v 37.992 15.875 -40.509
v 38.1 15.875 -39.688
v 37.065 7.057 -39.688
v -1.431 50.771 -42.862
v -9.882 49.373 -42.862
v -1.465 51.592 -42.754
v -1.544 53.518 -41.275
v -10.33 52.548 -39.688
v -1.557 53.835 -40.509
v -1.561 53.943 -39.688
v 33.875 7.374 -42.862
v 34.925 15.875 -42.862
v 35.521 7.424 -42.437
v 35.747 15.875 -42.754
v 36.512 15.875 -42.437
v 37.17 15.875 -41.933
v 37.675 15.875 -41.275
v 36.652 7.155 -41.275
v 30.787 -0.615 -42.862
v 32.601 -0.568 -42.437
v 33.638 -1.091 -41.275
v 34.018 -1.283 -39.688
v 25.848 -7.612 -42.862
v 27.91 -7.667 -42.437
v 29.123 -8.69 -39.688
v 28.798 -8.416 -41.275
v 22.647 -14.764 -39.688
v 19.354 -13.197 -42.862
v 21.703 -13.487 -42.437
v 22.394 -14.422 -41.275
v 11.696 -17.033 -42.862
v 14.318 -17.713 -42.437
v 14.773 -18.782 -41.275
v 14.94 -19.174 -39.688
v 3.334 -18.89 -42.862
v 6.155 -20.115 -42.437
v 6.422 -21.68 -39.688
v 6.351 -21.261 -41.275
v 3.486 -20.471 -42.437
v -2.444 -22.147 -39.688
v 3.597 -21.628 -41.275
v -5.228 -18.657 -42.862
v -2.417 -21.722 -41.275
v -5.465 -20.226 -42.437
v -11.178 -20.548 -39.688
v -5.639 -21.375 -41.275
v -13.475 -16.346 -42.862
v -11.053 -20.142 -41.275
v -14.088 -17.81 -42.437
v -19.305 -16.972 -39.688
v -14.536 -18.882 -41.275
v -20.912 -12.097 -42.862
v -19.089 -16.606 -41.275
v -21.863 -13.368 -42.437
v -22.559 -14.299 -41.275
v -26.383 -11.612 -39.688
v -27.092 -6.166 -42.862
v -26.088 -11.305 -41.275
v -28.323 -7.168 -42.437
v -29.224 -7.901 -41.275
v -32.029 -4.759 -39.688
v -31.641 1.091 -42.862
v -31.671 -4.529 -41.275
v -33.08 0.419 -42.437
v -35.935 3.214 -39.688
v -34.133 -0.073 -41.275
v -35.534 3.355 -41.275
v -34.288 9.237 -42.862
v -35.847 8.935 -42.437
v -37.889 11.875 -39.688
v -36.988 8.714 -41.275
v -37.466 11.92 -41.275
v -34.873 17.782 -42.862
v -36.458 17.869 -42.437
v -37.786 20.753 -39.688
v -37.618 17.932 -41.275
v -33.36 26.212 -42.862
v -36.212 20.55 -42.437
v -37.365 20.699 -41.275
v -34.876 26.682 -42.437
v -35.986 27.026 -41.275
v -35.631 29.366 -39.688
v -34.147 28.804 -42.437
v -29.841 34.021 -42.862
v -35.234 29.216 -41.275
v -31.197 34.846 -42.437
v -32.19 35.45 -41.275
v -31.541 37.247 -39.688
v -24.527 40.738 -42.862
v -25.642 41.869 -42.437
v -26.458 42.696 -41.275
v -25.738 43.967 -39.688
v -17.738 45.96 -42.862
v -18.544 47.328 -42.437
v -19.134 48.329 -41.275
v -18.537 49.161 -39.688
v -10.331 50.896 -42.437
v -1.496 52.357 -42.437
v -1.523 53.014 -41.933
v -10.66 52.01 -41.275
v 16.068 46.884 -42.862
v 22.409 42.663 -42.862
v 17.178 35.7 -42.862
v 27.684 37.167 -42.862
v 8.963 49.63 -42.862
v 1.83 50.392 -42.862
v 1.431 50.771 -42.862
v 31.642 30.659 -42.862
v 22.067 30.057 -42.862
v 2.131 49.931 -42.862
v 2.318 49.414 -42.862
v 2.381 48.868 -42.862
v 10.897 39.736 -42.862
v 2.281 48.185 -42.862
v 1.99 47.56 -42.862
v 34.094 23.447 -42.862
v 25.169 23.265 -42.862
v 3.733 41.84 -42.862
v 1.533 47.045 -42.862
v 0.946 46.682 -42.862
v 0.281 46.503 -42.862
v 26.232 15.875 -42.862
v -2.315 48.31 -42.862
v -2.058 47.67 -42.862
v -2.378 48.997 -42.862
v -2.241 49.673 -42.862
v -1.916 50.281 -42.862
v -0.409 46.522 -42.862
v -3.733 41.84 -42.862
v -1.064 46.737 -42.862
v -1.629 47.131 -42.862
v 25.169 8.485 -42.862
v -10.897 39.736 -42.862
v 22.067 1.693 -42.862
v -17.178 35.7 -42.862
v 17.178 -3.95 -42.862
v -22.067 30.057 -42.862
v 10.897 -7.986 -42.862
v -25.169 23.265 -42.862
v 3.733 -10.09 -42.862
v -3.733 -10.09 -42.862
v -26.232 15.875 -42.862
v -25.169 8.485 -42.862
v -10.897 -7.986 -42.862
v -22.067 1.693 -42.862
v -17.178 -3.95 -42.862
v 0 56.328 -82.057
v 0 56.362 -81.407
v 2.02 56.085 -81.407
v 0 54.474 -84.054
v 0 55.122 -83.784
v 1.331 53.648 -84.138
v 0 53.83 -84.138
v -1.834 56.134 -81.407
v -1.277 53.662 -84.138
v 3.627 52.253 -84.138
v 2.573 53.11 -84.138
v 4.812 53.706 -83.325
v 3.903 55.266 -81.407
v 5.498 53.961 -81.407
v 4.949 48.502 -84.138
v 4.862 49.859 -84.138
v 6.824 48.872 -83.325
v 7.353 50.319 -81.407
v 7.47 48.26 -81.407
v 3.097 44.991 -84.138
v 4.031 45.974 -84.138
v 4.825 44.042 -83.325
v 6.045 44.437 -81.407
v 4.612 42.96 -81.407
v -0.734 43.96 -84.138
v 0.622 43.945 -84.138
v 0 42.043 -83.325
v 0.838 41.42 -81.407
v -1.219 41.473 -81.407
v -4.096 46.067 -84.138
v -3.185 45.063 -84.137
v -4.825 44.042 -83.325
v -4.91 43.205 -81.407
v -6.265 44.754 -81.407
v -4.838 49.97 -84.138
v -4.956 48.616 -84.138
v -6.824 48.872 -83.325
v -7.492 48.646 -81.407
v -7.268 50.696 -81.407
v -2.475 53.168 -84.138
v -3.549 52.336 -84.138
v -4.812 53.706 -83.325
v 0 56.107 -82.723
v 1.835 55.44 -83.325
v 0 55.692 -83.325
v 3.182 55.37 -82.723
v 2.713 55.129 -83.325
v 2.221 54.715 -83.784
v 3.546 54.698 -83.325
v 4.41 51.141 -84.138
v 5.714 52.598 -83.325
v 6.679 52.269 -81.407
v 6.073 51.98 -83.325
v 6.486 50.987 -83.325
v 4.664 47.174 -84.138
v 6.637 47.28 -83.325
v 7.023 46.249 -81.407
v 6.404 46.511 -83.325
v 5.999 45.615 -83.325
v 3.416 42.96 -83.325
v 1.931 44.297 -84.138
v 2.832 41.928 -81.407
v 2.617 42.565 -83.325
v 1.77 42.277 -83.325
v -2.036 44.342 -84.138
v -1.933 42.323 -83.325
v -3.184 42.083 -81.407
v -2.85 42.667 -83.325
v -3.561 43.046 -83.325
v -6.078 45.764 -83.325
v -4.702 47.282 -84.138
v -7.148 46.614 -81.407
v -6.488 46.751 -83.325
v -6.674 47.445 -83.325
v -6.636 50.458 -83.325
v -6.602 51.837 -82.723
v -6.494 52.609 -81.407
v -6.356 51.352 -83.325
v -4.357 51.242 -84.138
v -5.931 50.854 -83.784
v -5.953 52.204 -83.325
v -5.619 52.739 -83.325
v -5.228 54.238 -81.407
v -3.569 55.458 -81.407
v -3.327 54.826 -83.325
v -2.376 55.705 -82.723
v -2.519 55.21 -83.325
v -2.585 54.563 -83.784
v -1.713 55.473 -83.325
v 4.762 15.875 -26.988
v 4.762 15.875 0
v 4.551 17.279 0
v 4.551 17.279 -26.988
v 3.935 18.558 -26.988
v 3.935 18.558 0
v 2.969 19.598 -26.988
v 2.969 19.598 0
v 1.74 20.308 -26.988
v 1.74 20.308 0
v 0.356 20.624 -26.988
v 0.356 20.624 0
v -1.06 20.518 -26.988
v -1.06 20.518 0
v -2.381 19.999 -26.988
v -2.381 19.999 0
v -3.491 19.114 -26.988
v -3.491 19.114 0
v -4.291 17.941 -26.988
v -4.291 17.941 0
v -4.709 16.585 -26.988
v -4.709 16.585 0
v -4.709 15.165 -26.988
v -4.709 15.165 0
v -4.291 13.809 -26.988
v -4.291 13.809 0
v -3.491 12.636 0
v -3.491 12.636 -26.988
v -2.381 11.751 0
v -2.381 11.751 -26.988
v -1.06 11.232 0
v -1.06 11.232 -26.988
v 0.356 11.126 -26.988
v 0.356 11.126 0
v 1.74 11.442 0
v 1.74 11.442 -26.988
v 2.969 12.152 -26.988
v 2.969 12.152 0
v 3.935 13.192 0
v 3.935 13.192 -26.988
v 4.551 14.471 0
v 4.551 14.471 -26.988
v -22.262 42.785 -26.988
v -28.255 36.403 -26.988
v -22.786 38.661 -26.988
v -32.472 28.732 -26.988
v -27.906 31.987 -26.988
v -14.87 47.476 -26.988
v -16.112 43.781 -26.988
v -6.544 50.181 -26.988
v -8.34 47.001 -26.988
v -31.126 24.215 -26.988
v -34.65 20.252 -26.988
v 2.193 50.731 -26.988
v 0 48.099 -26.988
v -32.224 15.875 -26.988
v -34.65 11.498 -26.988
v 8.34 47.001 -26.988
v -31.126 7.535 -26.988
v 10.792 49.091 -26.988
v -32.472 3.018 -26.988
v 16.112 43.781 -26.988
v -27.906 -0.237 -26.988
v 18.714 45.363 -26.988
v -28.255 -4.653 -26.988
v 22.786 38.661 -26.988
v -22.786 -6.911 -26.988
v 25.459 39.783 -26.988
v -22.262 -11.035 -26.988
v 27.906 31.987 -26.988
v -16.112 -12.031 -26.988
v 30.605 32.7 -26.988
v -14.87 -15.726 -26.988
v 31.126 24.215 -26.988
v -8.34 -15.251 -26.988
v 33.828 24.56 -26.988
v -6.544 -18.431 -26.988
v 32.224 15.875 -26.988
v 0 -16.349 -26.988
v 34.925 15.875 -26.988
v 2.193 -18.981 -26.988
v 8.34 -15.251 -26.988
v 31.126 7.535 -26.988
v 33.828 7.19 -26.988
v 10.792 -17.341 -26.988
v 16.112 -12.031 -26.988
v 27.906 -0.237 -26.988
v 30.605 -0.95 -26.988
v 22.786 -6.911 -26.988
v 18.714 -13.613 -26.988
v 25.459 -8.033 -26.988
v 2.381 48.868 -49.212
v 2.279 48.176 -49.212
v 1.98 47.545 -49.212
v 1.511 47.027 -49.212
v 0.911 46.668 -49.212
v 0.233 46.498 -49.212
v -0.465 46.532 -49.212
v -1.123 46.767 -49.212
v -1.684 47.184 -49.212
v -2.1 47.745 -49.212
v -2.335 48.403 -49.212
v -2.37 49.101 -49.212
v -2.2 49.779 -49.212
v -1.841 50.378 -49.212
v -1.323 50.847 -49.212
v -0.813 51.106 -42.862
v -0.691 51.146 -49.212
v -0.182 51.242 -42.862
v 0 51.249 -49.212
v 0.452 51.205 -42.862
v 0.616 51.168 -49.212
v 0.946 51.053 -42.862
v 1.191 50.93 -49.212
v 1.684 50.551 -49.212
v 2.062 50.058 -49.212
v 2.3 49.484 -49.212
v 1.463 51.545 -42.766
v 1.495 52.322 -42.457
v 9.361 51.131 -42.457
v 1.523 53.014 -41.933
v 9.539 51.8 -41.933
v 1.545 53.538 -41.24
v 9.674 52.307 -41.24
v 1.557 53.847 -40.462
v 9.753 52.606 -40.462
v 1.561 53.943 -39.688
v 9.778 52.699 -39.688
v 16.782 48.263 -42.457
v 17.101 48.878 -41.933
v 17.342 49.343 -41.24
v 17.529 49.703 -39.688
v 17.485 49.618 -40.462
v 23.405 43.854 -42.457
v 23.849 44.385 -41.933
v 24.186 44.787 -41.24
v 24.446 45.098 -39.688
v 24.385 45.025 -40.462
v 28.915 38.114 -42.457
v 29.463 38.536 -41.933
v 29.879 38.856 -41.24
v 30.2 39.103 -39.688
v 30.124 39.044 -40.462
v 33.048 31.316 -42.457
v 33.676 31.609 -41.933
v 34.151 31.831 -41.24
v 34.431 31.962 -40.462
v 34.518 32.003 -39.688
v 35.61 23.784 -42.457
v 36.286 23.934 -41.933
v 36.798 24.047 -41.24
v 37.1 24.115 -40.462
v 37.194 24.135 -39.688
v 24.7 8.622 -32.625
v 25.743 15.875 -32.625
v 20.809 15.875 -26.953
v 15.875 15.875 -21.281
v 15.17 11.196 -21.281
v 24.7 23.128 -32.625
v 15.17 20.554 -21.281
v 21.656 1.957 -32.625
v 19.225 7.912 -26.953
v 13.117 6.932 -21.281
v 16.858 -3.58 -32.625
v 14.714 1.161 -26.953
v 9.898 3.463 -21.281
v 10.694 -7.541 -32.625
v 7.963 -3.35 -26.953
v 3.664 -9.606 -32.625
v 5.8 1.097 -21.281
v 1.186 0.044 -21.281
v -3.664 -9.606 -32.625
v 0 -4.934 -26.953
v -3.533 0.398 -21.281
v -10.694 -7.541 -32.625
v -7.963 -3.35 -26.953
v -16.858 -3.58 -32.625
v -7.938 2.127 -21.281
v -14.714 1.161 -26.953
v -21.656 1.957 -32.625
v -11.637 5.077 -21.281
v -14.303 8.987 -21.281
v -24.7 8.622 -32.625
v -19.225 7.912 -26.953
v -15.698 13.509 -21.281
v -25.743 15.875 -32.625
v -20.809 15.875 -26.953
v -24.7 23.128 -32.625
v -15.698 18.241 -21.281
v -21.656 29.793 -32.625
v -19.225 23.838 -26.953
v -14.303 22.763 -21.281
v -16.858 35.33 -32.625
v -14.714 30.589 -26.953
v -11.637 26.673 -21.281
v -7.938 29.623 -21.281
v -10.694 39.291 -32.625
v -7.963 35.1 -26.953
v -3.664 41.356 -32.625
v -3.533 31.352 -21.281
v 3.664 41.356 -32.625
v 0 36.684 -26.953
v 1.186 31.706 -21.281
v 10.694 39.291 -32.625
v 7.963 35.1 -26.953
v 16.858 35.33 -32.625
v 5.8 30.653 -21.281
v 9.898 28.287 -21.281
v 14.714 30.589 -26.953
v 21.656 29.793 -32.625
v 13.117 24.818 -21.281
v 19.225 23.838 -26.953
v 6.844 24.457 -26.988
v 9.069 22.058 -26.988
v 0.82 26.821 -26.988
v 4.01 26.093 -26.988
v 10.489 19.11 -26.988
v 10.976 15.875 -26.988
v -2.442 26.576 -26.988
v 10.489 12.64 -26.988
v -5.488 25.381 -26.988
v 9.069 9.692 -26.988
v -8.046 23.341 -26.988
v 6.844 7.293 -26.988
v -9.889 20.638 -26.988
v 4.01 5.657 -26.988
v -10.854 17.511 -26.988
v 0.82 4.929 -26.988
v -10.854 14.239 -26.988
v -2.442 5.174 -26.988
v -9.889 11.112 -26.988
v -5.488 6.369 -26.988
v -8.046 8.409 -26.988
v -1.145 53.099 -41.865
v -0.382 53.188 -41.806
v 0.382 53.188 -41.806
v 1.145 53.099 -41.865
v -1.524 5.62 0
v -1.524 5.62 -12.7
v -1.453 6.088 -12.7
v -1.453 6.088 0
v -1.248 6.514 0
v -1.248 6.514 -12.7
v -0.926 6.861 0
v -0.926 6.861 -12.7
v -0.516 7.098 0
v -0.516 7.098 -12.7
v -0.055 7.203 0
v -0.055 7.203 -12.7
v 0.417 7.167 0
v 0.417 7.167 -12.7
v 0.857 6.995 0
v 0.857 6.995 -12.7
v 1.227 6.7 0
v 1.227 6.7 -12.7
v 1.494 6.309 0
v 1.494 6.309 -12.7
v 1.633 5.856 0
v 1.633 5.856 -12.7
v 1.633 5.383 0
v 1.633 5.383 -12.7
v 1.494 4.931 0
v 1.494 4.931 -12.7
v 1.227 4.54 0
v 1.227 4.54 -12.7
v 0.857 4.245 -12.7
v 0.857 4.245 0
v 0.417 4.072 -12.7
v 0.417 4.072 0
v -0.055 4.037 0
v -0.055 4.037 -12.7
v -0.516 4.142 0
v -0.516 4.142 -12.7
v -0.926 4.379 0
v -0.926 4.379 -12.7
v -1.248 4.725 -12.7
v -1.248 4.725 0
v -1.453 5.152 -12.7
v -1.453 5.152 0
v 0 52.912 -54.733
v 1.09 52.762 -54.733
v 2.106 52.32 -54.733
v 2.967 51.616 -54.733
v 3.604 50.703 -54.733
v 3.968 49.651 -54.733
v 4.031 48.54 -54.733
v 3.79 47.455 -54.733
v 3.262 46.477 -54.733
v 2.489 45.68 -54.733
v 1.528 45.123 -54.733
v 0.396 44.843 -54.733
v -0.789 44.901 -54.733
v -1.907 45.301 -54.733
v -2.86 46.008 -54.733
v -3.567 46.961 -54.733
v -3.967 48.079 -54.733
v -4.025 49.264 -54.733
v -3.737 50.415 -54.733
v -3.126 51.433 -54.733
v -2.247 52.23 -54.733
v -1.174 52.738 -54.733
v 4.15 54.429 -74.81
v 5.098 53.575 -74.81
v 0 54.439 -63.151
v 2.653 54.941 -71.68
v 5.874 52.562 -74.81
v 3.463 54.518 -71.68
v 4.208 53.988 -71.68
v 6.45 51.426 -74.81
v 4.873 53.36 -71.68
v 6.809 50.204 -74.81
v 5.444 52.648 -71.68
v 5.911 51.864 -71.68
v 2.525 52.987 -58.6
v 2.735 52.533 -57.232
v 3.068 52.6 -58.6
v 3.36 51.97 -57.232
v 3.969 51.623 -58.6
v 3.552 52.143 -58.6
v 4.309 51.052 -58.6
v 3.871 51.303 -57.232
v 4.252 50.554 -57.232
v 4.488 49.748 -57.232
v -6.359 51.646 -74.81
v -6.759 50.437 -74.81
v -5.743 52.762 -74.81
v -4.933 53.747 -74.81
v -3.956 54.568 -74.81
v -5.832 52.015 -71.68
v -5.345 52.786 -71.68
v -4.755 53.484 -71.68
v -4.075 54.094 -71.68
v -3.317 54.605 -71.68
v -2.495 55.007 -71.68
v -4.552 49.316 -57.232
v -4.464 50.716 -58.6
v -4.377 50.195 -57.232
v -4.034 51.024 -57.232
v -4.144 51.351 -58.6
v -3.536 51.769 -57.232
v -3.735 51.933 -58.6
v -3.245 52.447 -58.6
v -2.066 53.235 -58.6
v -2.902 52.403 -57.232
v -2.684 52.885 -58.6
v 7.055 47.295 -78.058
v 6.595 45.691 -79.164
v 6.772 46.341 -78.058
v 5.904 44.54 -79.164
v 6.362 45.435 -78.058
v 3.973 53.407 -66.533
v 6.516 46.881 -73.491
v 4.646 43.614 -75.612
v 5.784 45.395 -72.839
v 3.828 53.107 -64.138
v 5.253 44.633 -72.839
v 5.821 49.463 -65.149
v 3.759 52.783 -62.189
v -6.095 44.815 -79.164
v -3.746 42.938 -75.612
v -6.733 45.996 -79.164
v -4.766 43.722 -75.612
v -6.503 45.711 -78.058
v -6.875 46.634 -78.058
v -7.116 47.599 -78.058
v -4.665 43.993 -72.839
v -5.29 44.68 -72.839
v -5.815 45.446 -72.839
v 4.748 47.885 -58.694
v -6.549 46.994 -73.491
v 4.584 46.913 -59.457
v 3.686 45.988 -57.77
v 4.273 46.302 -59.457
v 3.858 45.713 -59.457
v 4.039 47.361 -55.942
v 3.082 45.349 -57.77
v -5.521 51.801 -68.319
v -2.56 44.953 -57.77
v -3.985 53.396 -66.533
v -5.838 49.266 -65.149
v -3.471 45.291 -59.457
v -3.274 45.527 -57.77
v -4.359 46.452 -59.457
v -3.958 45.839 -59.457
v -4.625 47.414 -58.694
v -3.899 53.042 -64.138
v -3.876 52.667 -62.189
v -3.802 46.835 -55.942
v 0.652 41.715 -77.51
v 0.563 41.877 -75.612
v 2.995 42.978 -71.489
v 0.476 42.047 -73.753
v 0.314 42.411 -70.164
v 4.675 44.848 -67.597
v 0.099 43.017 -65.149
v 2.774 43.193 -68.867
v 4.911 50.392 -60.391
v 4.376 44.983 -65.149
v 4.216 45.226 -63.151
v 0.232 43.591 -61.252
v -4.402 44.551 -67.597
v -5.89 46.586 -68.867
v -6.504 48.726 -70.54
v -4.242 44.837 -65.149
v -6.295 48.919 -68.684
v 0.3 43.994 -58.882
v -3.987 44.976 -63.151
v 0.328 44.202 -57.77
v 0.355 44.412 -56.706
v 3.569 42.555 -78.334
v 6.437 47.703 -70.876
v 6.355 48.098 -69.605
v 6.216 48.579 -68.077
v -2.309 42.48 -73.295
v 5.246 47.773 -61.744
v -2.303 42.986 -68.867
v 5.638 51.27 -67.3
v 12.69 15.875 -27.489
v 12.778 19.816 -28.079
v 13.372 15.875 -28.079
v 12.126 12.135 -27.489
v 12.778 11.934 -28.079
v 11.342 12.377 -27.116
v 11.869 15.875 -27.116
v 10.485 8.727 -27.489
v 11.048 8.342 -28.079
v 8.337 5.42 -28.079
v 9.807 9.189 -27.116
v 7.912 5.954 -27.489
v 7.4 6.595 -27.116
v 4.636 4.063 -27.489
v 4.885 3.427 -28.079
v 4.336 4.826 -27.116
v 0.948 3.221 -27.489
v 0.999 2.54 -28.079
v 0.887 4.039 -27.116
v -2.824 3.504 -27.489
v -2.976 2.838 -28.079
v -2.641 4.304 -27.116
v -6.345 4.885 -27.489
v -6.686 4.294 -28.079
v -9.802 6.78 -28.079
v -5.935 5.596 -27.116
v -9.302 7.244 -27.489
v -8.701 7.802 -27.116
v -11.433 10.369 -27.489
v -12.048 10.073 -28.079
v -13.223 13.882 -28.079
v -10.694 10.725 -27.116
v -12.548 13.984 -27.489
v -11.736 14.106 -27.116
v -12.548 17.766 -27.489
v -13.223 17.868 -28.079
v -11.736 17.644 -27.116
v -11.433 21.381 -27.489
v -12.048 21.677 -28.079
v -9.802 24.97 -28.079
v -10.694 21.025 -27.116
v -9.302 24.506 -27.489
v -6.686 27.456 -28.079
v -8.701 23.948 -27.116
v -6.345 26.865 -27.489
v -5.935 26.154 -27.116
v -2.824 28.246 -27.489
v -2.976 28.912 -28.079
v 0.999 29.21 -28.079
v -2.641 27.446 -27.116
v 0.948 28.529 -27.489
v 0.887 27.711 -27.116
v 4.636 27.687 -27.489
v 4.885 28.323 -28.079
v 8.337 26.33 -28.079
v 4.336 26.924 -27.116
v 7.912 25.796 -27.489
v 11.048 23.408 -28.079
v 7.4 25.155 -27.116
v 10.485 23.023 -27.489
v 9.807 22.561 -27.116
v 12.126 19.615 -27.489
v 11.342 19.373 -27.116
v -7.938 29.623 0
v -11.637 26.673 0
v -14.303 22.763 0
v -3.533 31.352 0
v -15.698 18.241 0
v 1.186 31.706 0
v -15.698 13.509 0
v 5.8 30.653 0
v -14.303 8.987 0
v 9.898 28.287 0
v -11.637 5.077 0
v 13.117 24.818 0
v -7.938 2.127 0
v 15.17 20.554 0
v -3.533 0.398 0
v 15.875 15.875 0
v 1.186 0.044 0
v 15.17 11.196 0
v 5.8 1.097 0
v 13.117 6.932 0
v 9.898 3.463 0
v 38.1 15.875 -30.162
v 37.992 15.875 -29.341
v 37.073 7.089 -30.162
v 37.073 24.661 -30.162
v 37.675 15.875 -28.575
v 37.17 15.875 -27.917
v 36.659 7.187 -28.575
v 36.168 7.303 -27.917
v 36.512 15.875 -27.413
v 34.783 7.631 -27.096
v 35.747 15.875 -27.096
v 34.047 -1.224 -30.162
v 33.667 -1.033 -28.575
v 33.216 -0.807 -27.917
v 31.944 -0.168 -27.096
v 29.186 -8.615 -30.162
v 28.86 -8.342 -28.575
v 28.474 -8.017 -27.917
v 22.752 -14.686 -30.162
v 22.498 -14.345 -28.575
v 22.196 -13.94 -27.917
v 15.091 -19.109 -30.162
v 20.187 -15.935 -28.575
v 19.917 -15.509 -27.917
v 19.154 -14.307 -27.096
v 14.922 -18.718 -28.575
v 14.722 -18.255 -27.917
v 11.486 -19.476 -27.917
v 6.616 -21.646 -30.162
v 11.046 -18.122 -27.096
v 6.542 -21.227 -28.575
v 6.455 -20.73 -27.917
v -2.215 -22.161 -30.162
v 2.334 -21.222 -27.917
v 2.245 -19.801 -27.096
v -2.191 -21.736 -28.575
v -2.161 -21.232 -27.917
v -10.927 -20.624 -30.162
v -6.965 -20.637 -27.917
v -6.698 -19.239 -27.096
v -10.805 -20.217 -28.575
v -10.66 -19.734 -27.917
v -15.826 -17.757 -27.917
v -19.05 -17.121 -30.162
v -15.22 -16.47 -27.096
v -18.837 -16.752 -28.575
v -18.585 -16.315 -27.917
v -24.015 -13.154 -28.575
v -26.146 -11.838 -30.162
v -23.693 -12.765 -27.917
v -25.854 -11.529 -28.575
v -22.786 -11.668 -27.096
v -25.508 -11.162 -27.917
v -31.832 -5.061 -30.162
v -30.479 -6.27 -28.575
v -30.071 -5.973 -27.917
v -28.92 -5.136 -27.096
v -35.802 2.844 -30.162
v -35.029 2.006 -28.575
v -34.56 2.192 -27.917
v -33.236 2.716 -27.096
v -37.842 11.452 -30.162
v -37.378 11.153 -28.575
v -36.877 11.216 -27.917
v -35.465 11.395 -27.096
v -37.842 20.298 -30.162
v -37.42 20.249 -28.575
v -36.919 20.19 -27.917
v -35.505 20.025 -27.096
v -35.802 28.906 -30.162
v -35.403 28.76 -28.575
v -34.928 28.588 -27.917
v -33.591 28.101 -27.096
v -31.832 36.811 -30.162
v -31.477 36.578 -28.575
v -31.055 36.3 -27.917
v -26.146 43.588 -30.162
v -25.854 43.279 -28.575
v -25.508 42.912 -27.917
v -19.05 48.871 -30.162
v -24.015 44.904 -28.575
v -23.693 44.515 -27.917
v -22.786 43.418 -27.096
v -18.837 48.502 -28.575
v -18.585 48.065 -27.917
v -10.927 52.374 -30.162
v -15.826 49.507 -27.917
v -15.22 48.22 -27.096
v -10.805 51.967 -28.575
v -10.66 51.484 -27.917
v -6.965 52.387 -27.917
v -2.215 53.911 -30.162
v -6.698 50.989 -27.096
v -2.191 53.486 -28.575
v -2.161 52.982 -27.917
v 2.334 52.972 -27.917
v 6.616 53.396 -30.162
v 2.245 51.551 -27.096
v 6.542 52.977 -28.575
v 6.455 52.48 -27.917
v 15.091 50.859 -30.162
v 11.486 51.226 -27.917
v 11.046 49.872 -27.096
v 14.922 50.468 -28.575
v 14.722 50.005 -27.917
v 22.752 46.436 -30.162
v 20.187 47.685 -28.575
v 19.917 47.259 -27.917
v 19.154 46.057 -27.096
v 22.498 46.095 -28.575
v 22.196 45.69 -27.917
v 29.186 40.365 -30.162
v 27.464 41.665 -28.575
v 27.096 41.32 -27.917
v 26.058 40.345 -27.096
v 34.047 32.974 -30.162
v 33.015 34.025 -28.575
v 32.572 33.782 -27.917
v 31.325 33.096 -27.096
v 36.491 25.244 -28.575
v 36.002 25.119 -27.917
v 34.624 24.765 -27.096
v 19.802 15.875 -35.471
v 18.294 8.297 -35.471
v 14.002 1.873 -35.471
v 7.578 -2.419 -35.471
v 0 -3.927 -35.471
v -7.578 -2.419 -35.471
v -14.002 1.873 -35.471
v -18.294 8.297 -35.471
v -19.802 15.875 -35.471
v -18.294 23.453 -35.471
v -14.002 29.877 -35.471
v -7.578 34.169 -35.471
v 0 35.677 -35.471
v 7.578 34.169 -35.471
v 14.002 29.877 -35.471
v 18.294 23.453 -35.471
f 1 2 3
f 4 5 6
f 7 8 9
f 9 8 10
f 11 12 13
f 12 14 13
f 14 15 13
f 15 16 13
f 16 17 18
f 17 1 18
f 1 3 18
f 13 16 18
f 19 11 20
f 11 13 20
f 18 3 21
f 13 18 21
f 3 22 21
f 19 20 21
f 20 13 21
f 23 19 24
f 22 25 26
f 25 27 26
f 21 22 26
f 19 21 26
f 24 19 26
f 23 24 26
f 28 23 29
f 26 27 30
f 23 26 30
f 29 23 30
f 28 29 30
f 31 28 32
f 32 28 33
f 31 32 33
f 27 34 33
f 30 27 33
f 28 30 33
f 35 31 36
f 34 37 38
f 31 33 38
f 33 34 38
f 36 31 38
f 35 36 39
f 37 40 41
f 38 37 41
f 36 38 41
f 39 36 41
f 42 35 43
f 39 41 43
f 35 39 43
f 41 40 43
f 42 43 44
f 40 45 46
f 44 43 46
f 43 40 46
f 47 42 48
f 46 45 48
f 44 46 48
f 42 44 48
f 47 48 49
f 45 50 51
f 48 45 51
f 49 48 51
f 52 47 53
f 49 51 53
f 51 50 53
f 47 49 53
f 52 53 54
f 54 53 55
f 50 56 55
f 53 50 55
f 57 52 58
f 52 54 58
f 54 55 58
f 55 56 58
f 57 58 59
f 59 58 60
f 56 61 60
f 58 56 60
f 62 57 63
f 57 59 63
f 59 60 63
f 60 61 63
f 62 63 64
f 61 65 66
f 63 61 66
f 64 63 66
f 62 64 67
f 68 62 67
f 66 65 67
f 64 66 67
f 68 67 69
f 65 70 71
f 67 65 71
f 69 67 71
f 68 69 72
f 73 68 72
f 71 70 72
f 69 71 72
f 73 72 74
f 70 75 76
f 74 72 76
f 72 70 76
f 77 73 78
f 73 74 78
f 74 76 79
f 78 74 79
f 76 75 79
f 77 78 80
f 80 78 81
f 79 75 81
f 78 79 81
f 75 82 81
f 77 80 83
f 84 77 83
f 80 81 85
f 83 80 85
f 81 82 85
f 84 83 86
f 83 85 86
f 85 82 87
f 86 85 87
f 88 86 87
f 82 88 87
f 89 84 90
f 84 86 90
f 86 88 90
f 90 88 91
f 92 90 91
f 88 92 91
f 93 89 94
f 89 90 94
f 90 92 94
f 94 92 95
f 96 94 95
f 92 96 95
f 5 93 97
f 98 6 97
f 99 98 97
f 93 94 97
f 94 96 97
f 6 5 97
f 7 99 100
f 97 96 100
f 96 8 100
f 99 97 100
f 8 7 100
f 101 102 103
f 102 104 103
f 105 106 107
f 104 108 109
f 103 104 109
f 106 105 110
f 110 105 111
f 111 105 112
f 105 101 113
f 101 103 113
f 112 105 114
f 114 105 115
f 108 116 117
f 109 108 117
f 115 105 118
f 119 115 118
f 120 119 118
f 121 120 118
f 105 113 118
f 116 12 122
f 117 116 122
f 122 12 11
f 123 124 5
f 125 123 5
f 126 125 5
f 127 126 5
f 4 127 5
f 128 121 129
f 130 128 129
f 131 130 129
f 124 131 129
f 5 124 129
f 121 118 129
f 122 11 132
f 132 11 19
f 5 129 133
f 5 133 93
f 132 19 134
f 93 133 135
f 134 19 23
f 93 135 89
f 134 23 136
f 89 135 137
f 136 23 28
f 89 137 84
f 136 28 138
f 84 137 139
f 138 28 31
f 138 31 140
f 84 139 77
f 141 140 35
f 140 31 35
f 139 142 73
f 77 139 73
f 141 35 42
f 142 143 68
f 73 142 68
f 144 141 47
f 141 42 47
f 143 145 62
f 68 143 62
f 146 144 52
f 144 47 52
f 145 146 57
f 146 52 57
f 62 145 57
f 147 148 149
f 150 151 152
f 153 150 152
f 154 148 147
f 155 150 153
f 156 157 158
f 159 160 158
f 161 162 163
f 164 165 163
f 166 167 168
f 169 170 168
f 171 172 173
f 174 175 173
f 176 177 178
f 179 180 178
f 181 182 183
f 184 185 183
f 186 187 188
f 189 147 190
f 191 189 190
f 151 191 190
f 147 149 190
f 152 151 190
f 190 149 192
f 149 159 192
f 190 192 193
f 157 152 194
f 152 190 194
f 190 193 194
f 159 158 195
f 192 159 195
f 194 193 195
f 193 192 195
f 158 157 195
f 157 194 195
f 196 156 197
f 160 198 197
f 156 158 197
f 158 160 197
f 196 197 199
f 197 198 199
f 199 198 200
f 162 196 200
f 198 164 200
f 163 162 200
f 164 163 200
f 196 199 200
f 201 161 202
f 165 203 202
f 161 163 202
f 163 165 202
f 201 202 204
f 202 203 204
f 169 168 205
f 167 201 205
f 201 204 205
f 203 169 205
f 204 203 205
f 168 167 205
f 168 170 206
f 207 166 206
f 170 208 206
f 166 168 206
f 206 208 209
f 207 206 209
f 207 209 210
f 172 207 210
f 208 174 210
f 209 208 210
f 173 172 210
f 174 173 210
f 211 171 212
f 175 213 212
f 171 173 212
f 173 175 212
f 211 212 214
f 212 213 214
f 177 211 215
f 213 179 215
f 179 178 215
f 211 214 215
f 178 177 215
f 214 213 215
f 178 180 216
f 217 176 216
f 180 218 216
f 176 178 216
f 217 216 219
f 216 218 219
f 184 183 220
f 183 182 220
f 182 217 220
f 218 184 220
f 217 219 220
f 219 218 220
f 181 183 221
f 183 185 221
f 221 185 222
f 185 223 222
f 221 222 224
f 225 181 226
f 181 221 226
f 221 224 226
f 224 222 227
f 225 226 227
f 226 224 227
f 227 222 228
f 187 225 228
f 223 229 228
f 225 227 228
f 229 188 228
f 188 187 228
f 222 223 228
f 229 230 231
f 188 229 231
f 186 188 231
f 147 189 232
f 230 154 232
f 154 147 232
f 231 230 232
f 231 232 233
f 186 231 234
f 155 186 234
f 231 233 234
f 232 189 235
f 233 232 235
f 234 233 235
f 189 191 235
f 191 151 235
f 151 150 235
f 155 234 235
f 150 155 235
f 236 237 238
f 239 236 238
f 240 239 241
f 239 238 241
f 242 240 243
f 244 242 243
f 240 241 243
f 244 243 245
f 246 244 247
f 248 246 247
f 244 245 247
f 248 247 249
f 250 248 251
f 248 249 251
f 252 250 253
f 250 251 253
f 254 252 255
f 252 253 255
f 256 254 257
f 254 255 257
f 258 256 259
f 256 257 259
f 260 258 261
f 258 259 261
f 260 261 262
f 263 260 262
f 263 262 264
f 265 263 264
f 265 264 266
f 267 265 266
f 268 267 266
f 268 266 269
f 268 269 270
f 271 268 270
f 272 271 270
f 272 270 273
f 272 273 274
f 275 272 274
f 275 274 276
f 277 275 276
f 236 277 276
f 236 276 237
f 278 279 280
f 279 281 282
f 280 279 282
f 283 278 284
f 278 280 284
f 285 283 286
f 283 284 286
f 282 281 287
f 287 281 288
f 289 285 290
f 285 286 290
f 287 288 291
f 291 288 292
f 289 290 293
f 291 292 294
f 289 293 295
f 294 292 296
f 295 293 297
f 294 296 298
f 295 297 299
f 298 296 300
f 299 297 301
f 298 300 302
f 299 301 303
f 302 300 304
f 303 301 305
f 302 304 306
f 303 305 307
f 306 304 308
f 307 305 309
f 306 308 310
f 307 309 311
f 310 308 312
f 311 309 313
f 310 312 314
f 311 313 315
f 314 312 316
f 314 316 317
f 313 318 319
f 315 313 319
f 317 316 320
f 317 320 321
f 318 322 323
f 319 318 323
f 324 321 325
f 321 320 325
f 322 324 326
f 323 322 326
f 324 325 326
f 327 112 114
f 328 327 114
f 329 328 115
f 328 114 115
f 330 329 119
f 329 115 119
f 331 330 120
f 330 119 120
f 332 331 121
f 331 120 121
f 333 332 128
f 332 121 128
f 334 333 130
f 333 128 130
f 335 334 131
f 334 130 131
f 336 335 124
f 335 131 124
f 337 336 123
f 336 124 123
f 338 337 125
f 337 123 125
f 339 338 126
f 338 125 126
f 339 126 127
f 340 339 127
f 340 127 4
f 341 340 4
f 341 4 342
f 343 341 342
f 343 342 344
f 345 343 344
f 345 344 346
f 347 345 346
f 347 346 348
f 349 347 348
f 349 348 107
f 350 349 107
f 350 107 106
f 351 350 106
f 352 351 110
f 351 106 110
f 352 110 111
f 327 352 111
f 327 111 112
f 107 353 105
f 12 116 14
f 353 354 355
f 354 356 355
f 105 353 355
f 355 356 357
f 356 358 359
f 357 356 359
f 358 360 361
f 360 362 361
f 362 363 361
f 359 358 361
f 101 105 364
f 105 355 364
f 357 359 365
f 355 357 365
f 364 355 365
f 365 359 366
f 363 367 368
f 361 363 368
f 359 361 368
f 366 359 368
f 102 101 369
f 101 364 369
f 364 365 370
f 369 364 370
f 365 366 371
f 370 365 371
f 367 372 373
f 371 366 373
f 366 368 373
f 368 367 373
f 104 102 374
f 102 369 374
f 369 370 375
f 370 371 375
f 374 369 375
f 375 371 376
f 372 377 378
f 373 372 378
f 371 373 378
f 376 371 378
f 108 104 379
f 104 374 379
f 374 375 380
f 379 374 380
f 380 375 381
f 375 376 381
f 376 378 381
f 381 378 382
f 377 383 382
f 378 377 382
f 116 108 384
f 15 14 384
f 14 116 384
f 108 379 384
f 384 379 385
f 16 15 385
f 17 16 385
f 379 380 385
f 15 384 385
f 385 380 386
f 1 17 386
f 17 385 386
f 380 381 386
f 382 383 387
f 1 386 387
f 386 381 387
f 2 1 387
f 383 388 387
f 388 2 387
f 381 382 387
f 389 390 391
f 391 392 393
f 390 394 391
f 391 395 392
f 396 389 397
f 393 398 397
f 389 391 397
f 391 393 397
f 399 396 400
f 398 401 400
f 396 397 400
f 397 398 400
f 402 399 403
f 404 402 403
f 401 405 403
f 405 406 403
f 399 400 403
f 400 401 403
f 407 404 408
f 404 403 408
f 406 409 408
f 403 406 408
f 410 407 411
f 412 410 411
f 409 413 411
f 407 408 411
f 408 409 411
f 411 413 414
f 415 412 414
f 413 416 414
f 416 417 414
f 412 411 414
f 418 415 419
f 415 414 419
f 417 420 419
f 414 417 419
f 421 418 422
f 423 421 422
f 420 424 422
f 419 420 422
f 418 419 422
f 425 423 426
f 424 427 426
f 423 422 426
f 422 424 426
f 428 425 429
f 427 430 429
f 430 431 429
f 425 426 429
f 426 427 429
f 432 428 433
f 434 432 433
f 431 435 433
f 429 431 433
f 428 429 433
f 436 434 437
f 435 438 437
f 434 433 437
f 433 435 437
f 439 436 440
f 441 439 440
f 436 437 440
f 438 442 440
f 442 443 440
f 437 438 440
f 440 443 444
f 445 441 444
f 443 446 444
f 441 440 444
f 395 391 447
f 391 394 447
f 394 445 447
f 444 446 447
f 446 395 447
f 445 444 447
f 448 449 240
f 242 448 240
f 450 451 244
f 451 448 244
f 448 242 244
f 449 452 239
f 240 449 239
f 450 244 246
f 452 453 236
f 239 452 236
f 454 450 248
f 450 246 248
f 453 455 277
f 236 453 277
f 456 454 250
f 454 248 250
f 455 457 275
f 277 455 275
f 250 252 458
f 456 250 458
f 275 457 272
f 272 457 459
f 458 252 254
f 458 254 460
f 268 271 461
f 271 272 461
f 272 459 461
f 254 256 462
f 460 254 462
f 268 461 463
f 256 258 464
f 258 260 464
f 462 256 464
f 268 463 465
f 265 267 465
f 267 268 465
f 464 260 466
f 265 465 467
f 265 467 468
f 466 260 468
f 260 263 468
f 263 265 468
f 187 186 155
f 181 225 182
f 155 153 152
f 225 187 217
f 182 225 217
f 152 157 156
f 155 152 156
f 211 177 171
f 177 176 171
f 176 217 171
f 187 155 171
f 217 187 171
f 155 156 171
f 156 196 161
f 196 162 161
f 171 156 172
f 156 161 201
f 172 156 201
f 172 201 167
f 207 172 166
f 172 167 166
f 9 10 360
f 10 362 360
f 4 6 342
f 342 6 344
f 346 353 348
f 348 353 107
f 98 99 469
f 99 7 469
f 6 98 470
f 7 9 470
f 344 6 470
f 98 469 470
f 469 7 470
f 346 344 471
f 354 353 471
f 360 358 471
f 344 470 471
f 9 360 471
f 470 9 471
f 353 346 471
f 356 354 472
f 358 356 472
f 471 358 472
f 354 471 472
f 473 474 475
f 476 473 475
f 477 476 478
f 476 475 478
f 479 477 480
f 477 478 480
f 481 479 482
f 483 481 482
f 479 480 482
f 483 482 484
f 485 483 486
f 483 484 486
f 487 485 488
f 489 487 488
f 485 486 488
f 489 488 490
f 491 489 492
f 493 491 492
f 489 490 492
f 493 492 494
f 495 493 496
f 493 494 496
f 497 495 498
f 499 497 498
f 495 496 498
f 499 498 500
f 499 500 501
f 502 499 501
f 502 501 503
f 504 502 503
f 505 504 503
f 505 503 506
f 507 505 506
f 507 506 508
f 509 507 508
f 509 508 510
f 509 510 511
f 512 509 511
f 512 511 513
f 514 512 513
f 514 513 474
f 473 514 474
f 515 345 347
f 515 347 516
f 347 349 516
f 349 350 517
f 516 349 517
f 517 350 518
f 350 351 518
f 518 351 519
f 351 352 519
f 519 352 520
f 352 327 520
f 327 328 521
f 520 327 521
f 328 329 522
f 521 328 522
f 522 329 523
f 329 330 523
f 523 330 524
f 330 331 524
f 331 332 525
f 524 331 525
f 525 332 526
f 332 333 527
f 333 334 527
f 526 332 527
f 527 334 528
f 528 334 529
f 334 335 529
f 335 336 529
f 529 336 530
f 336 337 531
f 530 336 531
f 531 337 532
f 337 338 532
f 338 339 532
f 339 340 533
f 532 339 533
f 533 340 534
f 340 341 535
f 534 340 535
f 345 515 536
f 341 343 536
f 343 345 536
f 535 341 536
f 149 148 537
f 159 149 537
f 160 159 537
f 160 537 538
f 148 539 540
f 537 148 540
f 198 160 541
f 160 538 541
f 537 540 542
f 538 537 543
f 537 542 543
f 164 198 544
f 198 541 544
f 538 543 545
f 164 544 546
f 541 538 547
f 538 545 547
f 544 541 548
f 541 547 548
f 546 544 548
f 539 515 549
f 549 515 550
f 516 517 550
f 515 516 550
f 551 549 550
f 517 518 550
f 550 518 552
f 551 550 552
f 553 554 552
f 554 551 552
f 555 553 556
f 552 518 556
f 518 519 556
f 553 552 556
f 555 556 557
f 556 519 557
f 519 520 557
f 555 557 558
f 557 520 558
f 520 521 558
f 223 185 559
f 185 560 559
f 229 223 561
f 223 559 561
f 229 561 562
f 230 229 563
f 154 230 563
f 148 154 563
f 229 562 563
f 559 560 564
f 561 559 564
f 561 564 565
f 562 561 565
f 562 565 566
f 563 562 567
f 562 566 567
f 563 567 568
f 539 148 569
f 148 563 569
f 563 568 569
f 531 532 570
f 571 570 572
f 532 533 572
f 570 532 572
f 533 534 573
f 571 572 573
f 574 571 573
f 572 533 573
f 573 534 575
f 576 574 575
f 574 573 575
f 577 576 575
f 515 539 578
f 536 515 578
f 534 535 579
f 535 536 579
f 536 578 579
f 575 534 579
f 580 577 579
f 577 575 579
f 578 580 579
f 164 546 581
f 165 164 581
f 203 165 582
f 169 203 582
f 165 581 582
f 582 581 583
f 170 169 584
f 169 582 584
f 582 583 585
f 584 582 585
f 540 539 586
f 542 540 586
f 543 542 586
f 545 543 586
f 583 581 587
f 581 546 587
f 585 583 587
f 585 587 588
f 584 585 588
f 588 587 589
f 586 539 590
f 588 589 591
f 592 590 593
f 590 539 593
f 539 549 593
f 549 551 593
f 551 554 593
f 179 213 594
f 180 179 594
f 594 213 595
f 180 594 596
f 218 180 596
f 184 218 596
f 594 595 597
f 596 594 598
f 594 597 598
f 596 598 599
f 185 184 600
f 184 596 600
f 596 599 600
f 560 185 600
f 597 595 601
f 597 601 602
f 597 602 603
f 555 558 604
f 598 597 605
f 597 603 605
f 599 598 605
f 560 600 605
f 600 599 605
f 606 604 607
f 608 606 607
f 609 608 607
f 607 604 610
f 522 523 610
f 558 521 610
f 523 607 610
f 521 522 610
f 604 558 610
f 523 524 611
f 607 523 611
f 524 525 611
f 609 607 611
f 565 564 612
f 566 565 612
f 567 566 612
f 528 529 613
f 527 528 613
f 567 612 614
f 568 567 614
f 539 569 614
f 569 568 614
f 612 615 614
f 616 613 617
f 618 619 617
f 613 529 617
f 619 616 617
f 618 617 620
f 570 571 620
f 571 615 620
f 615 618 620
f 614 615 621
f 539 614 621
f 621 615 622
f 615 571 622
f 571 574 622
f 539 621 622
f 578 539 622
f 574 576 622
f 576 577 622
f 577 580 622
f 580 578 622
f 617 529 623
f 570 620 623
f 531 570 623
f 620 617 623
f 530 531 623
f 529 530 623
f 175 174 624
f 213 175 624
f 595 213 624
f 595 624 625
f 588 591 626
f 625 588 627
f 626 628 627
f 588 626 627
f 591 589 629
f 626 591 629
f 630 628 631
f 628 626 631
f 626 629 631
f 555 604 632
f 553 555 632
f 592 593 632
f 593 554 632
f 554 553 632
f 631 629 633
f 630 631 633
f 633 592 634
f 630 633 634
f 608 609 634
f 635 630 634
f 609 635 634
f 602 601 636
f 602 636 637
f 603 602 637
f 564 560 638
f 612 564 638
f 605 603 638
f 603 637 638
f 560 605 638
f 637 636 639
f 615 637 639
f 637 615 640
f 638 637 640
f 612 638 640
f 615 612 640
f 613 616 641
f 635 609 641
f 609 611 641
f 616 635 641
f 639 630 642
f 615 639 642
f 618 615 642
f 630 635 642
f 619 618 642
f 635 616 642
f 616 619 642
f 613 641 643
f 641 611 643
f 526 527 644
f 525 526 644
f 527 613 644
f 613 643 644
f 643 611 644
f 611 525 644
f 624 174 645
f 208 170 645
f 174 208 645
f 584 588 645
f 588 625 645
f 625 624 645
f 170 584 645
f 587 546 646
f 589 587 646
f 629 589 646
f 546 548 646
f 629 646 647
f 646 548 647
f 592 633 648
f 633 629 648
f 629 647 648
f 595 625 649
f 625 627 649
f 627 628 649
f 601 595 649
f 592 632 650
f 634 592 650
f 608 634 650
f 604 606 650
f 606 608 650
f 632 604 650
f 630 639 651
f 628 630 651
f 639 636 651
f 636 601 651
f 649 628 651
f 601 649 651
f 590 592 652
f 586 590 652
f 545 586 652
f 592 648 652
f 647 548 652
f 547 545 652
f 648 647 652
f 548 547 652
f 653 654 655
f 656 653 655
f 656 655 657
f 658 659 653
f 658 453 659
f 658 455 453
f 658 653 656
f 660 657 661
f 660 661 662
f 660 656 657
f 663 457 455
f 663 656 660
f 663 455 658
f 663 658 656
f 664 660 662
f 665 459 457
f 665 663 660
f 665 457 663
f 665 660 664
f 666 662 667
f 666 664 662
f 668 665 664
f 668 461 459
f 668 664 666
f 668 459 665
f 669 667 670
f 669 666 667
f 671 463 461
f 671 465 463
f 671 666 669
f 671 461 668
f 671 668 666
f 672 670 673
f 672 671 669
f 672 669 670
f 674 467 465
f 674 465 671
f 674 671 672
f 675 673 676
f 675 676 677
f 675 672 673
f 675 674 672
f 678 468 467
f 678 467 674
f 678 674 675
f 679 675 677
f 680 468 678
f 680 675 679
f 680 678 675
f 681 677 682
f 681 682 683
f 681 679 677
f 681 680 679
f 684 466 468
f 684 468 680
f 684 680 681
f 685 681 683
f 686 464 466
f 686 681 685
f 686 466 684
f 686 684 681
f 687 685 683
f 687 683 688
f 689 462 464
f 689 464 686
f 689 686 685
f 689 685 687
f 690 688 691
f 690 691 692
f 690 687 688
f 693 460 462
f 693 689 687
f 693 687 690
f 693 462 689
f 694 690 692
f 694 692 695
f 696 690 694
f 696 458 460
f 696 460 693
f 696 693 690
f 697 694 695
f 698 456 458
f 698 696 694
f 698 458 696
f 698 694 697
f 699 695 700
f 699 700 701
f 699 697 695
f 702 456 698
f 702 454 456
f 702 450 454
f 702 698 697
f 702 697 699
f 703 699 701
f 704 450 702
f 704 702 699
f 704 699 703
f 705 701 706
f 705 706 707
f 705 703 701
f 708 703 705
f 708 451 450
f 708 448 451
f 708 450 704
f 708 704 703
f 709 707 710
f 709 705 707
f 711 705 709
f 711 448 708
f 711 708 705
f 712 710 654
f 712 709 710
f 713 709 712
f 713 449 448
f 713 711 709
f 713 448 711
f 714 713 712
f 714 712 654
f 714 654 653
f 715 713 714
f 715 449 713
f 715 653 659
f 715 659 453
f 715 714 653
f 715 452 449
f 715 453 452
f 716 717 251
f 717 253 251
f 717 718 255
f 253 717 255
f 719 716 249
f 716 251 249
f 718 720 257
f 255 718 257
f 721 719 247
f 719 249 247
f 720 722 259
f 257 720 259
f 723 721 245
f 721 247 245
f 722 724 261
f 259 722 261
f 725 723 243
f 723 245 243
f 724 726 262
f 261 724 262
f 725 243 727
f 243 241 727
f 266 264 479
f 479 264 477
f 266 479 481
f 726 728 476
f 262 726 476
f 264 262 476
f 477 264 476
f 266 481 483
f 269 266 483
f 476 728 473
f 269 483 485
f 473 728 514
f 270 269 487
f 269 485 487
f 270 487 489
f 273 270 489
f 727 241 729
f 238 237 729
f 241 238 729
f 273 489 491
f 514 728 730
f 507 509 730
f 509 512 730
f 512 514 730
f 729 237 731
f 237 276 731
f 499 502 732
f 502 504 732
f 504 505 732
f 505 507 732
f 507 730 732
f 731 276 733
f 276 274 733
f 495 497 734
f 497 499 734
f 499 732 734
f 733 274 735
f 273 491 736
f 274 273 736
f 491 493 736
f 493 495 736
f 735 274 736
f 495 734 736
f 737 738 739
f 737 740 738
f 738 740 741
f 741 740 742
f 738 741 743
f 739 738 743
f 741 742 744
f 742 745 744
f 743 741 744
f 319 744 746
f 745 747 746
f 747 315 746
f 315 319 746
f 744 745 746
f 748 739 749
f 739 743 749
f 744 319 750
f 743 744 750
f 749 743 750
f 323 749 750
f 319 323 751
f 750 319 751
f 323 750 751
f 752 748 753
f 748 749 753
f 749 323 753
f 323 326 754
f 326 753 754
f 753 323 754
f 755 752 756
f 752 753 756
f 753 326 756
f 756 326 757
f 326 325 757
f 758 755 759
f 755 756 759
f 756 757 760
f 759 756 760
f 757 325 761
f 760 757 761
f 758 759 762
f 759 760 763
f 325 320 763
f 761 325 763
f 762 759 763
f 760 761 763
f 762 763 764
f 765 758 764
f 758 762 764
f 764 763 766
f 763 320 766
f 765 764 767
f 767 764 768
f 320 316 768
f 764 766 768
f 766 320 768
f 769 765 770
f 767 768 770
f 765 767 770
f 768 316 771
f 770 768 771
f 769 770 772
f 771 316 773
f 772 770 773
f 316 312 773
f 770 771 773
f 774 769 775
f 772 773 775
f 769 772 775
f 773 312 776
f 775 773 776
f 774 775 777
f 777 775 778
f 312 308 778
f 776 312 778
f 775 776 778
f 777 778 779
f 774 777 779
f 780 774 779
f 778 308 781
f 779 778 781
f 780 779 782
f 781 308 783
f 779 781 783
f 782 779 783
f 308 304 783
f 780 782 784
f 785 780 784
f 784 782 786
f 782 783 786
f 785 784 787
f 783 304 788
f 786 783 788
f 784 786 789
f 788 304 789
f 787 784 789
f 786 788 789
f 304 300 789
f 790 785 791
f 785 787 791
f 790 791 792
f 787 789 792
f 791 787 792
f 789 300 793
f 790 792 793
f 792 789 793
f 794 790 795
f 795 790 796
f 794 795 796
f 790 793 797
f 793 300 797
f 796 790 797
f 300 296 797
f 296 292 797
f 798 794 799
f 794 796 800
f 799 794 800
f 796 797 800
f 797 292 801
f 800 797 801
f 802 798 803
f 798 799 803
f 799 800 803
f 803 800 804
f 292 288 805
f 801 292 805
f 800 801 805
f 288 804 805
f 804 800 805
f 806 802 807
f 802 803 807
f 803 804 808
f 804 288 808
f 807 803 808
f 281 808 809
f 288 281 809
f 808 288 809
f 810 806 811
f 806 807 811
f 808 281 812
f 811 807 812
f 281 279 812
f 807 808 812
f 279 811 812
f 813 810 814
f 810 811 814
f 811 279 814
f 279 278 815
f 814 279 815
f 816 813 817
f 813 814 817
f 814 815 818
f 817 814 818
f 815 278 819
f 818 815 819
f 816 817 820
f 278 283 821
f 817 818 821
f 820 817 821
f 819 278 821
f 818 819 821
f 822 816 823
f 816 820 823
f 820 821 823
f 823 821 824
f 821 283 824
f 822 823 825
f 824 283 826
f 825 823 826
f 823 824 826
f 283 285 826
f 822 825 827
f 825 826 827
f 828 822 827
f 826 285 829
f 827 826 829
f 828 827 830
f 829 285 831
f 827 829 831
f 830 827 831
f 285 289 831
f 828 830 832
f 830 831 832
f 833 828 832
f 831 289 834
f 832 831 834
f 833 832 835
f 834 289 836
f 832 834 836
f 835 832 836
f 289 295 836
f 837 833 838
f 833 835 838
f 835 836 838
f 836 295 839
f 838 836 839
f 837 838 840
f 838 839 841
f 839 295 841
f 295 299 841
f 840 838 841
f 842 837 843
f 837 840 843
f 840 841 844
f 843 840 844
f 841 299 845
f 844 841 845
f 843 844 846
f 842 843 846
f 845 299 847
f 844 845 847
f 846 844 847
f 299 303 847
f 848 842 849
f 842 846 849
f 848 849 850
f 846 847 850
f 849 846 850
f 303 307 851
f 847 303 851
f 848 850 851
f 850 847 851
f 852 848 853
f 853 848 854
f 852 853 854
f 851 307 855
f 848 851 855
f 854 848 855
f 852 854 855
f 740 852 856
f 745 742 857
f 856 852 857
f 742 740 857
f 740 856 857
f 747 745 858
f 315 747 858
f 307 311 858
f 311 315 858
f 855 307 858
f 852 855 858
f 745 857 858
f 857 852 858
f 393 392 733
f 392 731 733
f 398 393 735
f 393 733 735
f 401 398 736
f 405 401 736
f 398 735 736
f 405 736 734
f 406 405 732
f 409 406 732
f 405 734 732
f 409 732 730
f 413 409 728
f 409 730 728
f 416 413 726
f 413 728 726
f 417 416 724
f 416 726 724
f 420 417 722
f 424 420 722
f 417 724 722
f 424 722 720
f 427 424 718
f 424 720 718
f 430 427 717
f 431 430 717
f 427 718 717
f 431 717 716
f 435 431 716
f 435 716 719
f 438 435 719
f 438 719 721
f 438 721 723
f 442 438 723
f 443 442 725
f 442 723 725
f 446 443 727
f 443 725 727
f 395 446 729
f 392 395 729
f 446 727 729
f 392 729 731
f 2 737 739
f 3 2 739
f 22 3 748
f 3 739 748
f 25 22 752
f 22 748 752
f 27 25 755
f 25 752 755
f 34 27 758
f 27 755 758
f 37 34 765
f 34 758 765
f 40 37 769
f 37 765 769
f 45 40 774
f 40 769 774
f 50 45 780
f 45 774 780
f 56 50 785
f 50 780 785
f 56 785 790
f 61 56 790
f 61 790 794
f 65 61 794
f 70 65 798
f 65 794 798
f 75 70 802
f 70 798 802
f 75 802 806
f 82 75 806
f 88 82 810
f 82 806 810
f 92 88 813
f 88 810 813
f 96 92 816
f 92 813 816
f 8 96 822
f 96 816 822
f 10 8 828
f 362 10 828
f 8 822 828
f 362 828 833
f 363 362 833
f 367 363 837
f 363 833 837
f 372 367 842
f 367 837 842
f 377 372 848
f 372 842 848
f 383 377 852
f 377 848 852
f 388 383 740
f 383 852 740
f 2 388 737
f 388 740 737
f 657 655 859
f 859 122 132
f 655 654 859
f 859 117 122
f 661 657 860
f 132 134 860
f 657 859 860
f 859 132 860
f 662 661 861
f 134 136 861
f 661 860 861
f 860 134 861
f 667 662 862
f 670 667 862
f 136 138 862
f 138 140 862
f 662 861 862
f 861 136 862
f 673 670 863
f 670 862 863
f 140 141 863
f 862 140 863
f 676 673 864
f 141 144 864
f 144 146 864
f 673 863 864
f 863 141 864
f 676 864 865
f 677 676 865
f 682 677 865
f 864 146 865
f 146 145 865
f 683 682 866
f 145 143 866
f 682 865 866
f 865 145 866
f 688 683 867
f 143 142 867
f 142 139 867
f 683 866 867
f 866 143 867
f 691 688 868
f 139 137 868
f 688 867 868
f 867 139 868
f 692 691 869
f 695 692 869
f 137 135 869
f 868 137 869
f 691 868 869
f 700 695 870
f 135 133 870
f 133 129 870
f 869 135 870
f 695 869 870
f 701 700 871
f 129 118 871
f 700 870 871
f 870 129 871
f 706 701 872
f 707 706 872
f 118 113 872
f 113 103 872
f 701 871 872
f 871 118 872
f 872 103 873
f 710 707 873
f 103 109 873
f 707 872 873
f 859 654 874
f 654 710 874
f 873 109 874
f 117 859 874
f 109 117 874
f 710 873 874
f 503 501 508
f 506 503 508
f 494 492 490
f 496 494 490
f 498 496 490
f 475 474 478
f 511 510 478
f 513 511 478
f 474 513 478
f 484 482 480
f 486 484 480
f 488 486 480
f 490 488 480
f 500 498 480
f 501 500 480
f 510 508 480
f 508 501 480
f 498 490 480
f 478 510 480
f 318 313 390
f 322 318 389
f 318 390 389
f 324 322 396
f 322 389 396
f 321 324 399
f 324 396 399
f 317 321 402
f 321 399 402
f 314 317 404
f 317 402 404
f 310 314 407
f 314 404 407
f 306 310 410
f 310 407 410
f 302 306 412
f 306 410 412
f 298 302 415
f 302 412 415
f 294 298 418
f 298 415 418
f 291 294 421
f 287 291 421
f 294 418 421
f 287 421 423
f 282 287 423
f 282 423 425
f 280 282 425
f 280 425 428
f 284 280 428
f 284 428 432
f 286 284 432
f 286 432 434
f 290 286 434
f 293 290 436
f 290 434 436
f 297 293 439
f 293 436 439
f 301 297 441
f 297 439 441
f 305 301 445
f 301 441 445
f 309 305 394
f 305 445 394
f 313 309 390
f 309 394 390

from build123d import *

# Parameters (mm, degrees)
SKETCH3_R                        = 2.38125
BOSS_EXTRUDE1_DEPTH              = 6.35
FILLET1_R                        = 2.54
FILLET3_R                        = 3.175
SKETCH5_R                        = 4.7625
SCREW_HOLE_CUT_EXTRUDE2_DEPTH    = 109.204676355
F_1_8_0_125_DIAMETER_HOLE1_D     = 3.175
F_1_8_0_125_DIAMETER_HOLE1_DEPTH = 12.7


with BuildPart() as part:
    # Sketch2 → Revolve1 (revolve)
    with BuildSketch(Plane(origin=(0, 0, 0), x_dir=(0, 0, -1), z_dir=(1, 0, 0)), mode=Mode.PRIVATE) as revolve1_sk:
        Polygon((32.624937731, 41.617673457), (21.280797071, 31.75), (0, 31.75), (0, 18.415), (12.7, 18.415), (12.7, 15.875), (26.9875, 15.875), (26.9875, 28.297792362), (42.8625, 42.106622913), (42.8625, 53.975), (26.9875, 53.975), (26.9875, 48.098622271), align=None)
    revolve(revolve1_sk.sketch.rotate(Axis((0, 15.875, 0), (0, 0, -1)), 90), axis=Axis((0, 15.875, 0), (0, 0, -1)))

    # Sketch3 → Boss-Extrude1 (add)
    with BuildSketch(Plane(origin=(0, 0, -42.8625), x_dir=(-1, 0, 0), z_dir=(0, 0, -1))):
        with Locations(Location((0, 48.867541329, 0), (0, 0, 180))):
            Circle(SKETCH3_R)
    extrude(amount=BOSS_EXTRUDE1_DEPTH)

    # Sketch4 → Revolve2 (revolve)
    with BuildSketch(Plane(origin=(0, 0, 0), x_dir=(0, 0, -1), z_dir=(1, 0, 0))):
        with BuildLine():
            add(Edge.make_bspline(
                [(84.1375, 56.557956647), (57.469839142, 54.737210229), (49.2125, 51.248791329)],
                knots=[5.239339857, 5.239339857, 5.239339857, 6.012248194, 6.012248194, 6.012248194], degree=2, weights=[1, 0.926251327, 1]))
            Line((49.2125, 51.248791329), (49.2125, 48.867541329))
            Line((49.2125, 48.867541329), (84.1375, 48.867541329))
            Line((84.1375, 48.867541329), (84.1375, 56.557956647))
        make_face()
    revolve(axis=Axis((0, 48.867541329, -49.2125), (0, 0, -1)))

    # Fillet1
    fillet1_edges = [part.edges().sort_by_distance(p)[0] for p in [
        (0, 41.177126011, -84.1375),
    ]]
    fillet(fillet1_edges, radius=FILLET1_R)

    # Fillet3
    fillet3_edges = [part.edges().sort_by_distance(p)[0] for p in [
        (-38.1, 15.875, -26.9875),
        (-38.1, 15.875, -42.8625),
        (-12.422792362, 15.875, -26.9875),
    ]]
    fillet(fillet3_edges, radius=FILLET3_R)

    # Sketch5 → screw hole Cut-Extrude2 (cut, through all)
    with BuildSketch(Plane.XY):
        with Locations((0, 15.875)):
            Circle(SKETCH5_R)
    extrude(amount=-SCREW_HOLE_CUT_EXTRUDE2_DEPTH, mode=Mode.SUBTRACT)

    # 1/8 (0.125) Diameter Hole1
    with Locations(Plane(origin=(-4.34210106, -24.39093033, 0), x_dir=(1, 0, 0), z_dir=(0, 0, 1))):
        with Locations((4.40560106, 30.01068033)):
            Hole(F_1_8_0_125_DIAMETER_HOLE1_D / 2, depth=F_1_8_0_125_DIAMETER_HOLE1_DEPTH)


solid = part.part
